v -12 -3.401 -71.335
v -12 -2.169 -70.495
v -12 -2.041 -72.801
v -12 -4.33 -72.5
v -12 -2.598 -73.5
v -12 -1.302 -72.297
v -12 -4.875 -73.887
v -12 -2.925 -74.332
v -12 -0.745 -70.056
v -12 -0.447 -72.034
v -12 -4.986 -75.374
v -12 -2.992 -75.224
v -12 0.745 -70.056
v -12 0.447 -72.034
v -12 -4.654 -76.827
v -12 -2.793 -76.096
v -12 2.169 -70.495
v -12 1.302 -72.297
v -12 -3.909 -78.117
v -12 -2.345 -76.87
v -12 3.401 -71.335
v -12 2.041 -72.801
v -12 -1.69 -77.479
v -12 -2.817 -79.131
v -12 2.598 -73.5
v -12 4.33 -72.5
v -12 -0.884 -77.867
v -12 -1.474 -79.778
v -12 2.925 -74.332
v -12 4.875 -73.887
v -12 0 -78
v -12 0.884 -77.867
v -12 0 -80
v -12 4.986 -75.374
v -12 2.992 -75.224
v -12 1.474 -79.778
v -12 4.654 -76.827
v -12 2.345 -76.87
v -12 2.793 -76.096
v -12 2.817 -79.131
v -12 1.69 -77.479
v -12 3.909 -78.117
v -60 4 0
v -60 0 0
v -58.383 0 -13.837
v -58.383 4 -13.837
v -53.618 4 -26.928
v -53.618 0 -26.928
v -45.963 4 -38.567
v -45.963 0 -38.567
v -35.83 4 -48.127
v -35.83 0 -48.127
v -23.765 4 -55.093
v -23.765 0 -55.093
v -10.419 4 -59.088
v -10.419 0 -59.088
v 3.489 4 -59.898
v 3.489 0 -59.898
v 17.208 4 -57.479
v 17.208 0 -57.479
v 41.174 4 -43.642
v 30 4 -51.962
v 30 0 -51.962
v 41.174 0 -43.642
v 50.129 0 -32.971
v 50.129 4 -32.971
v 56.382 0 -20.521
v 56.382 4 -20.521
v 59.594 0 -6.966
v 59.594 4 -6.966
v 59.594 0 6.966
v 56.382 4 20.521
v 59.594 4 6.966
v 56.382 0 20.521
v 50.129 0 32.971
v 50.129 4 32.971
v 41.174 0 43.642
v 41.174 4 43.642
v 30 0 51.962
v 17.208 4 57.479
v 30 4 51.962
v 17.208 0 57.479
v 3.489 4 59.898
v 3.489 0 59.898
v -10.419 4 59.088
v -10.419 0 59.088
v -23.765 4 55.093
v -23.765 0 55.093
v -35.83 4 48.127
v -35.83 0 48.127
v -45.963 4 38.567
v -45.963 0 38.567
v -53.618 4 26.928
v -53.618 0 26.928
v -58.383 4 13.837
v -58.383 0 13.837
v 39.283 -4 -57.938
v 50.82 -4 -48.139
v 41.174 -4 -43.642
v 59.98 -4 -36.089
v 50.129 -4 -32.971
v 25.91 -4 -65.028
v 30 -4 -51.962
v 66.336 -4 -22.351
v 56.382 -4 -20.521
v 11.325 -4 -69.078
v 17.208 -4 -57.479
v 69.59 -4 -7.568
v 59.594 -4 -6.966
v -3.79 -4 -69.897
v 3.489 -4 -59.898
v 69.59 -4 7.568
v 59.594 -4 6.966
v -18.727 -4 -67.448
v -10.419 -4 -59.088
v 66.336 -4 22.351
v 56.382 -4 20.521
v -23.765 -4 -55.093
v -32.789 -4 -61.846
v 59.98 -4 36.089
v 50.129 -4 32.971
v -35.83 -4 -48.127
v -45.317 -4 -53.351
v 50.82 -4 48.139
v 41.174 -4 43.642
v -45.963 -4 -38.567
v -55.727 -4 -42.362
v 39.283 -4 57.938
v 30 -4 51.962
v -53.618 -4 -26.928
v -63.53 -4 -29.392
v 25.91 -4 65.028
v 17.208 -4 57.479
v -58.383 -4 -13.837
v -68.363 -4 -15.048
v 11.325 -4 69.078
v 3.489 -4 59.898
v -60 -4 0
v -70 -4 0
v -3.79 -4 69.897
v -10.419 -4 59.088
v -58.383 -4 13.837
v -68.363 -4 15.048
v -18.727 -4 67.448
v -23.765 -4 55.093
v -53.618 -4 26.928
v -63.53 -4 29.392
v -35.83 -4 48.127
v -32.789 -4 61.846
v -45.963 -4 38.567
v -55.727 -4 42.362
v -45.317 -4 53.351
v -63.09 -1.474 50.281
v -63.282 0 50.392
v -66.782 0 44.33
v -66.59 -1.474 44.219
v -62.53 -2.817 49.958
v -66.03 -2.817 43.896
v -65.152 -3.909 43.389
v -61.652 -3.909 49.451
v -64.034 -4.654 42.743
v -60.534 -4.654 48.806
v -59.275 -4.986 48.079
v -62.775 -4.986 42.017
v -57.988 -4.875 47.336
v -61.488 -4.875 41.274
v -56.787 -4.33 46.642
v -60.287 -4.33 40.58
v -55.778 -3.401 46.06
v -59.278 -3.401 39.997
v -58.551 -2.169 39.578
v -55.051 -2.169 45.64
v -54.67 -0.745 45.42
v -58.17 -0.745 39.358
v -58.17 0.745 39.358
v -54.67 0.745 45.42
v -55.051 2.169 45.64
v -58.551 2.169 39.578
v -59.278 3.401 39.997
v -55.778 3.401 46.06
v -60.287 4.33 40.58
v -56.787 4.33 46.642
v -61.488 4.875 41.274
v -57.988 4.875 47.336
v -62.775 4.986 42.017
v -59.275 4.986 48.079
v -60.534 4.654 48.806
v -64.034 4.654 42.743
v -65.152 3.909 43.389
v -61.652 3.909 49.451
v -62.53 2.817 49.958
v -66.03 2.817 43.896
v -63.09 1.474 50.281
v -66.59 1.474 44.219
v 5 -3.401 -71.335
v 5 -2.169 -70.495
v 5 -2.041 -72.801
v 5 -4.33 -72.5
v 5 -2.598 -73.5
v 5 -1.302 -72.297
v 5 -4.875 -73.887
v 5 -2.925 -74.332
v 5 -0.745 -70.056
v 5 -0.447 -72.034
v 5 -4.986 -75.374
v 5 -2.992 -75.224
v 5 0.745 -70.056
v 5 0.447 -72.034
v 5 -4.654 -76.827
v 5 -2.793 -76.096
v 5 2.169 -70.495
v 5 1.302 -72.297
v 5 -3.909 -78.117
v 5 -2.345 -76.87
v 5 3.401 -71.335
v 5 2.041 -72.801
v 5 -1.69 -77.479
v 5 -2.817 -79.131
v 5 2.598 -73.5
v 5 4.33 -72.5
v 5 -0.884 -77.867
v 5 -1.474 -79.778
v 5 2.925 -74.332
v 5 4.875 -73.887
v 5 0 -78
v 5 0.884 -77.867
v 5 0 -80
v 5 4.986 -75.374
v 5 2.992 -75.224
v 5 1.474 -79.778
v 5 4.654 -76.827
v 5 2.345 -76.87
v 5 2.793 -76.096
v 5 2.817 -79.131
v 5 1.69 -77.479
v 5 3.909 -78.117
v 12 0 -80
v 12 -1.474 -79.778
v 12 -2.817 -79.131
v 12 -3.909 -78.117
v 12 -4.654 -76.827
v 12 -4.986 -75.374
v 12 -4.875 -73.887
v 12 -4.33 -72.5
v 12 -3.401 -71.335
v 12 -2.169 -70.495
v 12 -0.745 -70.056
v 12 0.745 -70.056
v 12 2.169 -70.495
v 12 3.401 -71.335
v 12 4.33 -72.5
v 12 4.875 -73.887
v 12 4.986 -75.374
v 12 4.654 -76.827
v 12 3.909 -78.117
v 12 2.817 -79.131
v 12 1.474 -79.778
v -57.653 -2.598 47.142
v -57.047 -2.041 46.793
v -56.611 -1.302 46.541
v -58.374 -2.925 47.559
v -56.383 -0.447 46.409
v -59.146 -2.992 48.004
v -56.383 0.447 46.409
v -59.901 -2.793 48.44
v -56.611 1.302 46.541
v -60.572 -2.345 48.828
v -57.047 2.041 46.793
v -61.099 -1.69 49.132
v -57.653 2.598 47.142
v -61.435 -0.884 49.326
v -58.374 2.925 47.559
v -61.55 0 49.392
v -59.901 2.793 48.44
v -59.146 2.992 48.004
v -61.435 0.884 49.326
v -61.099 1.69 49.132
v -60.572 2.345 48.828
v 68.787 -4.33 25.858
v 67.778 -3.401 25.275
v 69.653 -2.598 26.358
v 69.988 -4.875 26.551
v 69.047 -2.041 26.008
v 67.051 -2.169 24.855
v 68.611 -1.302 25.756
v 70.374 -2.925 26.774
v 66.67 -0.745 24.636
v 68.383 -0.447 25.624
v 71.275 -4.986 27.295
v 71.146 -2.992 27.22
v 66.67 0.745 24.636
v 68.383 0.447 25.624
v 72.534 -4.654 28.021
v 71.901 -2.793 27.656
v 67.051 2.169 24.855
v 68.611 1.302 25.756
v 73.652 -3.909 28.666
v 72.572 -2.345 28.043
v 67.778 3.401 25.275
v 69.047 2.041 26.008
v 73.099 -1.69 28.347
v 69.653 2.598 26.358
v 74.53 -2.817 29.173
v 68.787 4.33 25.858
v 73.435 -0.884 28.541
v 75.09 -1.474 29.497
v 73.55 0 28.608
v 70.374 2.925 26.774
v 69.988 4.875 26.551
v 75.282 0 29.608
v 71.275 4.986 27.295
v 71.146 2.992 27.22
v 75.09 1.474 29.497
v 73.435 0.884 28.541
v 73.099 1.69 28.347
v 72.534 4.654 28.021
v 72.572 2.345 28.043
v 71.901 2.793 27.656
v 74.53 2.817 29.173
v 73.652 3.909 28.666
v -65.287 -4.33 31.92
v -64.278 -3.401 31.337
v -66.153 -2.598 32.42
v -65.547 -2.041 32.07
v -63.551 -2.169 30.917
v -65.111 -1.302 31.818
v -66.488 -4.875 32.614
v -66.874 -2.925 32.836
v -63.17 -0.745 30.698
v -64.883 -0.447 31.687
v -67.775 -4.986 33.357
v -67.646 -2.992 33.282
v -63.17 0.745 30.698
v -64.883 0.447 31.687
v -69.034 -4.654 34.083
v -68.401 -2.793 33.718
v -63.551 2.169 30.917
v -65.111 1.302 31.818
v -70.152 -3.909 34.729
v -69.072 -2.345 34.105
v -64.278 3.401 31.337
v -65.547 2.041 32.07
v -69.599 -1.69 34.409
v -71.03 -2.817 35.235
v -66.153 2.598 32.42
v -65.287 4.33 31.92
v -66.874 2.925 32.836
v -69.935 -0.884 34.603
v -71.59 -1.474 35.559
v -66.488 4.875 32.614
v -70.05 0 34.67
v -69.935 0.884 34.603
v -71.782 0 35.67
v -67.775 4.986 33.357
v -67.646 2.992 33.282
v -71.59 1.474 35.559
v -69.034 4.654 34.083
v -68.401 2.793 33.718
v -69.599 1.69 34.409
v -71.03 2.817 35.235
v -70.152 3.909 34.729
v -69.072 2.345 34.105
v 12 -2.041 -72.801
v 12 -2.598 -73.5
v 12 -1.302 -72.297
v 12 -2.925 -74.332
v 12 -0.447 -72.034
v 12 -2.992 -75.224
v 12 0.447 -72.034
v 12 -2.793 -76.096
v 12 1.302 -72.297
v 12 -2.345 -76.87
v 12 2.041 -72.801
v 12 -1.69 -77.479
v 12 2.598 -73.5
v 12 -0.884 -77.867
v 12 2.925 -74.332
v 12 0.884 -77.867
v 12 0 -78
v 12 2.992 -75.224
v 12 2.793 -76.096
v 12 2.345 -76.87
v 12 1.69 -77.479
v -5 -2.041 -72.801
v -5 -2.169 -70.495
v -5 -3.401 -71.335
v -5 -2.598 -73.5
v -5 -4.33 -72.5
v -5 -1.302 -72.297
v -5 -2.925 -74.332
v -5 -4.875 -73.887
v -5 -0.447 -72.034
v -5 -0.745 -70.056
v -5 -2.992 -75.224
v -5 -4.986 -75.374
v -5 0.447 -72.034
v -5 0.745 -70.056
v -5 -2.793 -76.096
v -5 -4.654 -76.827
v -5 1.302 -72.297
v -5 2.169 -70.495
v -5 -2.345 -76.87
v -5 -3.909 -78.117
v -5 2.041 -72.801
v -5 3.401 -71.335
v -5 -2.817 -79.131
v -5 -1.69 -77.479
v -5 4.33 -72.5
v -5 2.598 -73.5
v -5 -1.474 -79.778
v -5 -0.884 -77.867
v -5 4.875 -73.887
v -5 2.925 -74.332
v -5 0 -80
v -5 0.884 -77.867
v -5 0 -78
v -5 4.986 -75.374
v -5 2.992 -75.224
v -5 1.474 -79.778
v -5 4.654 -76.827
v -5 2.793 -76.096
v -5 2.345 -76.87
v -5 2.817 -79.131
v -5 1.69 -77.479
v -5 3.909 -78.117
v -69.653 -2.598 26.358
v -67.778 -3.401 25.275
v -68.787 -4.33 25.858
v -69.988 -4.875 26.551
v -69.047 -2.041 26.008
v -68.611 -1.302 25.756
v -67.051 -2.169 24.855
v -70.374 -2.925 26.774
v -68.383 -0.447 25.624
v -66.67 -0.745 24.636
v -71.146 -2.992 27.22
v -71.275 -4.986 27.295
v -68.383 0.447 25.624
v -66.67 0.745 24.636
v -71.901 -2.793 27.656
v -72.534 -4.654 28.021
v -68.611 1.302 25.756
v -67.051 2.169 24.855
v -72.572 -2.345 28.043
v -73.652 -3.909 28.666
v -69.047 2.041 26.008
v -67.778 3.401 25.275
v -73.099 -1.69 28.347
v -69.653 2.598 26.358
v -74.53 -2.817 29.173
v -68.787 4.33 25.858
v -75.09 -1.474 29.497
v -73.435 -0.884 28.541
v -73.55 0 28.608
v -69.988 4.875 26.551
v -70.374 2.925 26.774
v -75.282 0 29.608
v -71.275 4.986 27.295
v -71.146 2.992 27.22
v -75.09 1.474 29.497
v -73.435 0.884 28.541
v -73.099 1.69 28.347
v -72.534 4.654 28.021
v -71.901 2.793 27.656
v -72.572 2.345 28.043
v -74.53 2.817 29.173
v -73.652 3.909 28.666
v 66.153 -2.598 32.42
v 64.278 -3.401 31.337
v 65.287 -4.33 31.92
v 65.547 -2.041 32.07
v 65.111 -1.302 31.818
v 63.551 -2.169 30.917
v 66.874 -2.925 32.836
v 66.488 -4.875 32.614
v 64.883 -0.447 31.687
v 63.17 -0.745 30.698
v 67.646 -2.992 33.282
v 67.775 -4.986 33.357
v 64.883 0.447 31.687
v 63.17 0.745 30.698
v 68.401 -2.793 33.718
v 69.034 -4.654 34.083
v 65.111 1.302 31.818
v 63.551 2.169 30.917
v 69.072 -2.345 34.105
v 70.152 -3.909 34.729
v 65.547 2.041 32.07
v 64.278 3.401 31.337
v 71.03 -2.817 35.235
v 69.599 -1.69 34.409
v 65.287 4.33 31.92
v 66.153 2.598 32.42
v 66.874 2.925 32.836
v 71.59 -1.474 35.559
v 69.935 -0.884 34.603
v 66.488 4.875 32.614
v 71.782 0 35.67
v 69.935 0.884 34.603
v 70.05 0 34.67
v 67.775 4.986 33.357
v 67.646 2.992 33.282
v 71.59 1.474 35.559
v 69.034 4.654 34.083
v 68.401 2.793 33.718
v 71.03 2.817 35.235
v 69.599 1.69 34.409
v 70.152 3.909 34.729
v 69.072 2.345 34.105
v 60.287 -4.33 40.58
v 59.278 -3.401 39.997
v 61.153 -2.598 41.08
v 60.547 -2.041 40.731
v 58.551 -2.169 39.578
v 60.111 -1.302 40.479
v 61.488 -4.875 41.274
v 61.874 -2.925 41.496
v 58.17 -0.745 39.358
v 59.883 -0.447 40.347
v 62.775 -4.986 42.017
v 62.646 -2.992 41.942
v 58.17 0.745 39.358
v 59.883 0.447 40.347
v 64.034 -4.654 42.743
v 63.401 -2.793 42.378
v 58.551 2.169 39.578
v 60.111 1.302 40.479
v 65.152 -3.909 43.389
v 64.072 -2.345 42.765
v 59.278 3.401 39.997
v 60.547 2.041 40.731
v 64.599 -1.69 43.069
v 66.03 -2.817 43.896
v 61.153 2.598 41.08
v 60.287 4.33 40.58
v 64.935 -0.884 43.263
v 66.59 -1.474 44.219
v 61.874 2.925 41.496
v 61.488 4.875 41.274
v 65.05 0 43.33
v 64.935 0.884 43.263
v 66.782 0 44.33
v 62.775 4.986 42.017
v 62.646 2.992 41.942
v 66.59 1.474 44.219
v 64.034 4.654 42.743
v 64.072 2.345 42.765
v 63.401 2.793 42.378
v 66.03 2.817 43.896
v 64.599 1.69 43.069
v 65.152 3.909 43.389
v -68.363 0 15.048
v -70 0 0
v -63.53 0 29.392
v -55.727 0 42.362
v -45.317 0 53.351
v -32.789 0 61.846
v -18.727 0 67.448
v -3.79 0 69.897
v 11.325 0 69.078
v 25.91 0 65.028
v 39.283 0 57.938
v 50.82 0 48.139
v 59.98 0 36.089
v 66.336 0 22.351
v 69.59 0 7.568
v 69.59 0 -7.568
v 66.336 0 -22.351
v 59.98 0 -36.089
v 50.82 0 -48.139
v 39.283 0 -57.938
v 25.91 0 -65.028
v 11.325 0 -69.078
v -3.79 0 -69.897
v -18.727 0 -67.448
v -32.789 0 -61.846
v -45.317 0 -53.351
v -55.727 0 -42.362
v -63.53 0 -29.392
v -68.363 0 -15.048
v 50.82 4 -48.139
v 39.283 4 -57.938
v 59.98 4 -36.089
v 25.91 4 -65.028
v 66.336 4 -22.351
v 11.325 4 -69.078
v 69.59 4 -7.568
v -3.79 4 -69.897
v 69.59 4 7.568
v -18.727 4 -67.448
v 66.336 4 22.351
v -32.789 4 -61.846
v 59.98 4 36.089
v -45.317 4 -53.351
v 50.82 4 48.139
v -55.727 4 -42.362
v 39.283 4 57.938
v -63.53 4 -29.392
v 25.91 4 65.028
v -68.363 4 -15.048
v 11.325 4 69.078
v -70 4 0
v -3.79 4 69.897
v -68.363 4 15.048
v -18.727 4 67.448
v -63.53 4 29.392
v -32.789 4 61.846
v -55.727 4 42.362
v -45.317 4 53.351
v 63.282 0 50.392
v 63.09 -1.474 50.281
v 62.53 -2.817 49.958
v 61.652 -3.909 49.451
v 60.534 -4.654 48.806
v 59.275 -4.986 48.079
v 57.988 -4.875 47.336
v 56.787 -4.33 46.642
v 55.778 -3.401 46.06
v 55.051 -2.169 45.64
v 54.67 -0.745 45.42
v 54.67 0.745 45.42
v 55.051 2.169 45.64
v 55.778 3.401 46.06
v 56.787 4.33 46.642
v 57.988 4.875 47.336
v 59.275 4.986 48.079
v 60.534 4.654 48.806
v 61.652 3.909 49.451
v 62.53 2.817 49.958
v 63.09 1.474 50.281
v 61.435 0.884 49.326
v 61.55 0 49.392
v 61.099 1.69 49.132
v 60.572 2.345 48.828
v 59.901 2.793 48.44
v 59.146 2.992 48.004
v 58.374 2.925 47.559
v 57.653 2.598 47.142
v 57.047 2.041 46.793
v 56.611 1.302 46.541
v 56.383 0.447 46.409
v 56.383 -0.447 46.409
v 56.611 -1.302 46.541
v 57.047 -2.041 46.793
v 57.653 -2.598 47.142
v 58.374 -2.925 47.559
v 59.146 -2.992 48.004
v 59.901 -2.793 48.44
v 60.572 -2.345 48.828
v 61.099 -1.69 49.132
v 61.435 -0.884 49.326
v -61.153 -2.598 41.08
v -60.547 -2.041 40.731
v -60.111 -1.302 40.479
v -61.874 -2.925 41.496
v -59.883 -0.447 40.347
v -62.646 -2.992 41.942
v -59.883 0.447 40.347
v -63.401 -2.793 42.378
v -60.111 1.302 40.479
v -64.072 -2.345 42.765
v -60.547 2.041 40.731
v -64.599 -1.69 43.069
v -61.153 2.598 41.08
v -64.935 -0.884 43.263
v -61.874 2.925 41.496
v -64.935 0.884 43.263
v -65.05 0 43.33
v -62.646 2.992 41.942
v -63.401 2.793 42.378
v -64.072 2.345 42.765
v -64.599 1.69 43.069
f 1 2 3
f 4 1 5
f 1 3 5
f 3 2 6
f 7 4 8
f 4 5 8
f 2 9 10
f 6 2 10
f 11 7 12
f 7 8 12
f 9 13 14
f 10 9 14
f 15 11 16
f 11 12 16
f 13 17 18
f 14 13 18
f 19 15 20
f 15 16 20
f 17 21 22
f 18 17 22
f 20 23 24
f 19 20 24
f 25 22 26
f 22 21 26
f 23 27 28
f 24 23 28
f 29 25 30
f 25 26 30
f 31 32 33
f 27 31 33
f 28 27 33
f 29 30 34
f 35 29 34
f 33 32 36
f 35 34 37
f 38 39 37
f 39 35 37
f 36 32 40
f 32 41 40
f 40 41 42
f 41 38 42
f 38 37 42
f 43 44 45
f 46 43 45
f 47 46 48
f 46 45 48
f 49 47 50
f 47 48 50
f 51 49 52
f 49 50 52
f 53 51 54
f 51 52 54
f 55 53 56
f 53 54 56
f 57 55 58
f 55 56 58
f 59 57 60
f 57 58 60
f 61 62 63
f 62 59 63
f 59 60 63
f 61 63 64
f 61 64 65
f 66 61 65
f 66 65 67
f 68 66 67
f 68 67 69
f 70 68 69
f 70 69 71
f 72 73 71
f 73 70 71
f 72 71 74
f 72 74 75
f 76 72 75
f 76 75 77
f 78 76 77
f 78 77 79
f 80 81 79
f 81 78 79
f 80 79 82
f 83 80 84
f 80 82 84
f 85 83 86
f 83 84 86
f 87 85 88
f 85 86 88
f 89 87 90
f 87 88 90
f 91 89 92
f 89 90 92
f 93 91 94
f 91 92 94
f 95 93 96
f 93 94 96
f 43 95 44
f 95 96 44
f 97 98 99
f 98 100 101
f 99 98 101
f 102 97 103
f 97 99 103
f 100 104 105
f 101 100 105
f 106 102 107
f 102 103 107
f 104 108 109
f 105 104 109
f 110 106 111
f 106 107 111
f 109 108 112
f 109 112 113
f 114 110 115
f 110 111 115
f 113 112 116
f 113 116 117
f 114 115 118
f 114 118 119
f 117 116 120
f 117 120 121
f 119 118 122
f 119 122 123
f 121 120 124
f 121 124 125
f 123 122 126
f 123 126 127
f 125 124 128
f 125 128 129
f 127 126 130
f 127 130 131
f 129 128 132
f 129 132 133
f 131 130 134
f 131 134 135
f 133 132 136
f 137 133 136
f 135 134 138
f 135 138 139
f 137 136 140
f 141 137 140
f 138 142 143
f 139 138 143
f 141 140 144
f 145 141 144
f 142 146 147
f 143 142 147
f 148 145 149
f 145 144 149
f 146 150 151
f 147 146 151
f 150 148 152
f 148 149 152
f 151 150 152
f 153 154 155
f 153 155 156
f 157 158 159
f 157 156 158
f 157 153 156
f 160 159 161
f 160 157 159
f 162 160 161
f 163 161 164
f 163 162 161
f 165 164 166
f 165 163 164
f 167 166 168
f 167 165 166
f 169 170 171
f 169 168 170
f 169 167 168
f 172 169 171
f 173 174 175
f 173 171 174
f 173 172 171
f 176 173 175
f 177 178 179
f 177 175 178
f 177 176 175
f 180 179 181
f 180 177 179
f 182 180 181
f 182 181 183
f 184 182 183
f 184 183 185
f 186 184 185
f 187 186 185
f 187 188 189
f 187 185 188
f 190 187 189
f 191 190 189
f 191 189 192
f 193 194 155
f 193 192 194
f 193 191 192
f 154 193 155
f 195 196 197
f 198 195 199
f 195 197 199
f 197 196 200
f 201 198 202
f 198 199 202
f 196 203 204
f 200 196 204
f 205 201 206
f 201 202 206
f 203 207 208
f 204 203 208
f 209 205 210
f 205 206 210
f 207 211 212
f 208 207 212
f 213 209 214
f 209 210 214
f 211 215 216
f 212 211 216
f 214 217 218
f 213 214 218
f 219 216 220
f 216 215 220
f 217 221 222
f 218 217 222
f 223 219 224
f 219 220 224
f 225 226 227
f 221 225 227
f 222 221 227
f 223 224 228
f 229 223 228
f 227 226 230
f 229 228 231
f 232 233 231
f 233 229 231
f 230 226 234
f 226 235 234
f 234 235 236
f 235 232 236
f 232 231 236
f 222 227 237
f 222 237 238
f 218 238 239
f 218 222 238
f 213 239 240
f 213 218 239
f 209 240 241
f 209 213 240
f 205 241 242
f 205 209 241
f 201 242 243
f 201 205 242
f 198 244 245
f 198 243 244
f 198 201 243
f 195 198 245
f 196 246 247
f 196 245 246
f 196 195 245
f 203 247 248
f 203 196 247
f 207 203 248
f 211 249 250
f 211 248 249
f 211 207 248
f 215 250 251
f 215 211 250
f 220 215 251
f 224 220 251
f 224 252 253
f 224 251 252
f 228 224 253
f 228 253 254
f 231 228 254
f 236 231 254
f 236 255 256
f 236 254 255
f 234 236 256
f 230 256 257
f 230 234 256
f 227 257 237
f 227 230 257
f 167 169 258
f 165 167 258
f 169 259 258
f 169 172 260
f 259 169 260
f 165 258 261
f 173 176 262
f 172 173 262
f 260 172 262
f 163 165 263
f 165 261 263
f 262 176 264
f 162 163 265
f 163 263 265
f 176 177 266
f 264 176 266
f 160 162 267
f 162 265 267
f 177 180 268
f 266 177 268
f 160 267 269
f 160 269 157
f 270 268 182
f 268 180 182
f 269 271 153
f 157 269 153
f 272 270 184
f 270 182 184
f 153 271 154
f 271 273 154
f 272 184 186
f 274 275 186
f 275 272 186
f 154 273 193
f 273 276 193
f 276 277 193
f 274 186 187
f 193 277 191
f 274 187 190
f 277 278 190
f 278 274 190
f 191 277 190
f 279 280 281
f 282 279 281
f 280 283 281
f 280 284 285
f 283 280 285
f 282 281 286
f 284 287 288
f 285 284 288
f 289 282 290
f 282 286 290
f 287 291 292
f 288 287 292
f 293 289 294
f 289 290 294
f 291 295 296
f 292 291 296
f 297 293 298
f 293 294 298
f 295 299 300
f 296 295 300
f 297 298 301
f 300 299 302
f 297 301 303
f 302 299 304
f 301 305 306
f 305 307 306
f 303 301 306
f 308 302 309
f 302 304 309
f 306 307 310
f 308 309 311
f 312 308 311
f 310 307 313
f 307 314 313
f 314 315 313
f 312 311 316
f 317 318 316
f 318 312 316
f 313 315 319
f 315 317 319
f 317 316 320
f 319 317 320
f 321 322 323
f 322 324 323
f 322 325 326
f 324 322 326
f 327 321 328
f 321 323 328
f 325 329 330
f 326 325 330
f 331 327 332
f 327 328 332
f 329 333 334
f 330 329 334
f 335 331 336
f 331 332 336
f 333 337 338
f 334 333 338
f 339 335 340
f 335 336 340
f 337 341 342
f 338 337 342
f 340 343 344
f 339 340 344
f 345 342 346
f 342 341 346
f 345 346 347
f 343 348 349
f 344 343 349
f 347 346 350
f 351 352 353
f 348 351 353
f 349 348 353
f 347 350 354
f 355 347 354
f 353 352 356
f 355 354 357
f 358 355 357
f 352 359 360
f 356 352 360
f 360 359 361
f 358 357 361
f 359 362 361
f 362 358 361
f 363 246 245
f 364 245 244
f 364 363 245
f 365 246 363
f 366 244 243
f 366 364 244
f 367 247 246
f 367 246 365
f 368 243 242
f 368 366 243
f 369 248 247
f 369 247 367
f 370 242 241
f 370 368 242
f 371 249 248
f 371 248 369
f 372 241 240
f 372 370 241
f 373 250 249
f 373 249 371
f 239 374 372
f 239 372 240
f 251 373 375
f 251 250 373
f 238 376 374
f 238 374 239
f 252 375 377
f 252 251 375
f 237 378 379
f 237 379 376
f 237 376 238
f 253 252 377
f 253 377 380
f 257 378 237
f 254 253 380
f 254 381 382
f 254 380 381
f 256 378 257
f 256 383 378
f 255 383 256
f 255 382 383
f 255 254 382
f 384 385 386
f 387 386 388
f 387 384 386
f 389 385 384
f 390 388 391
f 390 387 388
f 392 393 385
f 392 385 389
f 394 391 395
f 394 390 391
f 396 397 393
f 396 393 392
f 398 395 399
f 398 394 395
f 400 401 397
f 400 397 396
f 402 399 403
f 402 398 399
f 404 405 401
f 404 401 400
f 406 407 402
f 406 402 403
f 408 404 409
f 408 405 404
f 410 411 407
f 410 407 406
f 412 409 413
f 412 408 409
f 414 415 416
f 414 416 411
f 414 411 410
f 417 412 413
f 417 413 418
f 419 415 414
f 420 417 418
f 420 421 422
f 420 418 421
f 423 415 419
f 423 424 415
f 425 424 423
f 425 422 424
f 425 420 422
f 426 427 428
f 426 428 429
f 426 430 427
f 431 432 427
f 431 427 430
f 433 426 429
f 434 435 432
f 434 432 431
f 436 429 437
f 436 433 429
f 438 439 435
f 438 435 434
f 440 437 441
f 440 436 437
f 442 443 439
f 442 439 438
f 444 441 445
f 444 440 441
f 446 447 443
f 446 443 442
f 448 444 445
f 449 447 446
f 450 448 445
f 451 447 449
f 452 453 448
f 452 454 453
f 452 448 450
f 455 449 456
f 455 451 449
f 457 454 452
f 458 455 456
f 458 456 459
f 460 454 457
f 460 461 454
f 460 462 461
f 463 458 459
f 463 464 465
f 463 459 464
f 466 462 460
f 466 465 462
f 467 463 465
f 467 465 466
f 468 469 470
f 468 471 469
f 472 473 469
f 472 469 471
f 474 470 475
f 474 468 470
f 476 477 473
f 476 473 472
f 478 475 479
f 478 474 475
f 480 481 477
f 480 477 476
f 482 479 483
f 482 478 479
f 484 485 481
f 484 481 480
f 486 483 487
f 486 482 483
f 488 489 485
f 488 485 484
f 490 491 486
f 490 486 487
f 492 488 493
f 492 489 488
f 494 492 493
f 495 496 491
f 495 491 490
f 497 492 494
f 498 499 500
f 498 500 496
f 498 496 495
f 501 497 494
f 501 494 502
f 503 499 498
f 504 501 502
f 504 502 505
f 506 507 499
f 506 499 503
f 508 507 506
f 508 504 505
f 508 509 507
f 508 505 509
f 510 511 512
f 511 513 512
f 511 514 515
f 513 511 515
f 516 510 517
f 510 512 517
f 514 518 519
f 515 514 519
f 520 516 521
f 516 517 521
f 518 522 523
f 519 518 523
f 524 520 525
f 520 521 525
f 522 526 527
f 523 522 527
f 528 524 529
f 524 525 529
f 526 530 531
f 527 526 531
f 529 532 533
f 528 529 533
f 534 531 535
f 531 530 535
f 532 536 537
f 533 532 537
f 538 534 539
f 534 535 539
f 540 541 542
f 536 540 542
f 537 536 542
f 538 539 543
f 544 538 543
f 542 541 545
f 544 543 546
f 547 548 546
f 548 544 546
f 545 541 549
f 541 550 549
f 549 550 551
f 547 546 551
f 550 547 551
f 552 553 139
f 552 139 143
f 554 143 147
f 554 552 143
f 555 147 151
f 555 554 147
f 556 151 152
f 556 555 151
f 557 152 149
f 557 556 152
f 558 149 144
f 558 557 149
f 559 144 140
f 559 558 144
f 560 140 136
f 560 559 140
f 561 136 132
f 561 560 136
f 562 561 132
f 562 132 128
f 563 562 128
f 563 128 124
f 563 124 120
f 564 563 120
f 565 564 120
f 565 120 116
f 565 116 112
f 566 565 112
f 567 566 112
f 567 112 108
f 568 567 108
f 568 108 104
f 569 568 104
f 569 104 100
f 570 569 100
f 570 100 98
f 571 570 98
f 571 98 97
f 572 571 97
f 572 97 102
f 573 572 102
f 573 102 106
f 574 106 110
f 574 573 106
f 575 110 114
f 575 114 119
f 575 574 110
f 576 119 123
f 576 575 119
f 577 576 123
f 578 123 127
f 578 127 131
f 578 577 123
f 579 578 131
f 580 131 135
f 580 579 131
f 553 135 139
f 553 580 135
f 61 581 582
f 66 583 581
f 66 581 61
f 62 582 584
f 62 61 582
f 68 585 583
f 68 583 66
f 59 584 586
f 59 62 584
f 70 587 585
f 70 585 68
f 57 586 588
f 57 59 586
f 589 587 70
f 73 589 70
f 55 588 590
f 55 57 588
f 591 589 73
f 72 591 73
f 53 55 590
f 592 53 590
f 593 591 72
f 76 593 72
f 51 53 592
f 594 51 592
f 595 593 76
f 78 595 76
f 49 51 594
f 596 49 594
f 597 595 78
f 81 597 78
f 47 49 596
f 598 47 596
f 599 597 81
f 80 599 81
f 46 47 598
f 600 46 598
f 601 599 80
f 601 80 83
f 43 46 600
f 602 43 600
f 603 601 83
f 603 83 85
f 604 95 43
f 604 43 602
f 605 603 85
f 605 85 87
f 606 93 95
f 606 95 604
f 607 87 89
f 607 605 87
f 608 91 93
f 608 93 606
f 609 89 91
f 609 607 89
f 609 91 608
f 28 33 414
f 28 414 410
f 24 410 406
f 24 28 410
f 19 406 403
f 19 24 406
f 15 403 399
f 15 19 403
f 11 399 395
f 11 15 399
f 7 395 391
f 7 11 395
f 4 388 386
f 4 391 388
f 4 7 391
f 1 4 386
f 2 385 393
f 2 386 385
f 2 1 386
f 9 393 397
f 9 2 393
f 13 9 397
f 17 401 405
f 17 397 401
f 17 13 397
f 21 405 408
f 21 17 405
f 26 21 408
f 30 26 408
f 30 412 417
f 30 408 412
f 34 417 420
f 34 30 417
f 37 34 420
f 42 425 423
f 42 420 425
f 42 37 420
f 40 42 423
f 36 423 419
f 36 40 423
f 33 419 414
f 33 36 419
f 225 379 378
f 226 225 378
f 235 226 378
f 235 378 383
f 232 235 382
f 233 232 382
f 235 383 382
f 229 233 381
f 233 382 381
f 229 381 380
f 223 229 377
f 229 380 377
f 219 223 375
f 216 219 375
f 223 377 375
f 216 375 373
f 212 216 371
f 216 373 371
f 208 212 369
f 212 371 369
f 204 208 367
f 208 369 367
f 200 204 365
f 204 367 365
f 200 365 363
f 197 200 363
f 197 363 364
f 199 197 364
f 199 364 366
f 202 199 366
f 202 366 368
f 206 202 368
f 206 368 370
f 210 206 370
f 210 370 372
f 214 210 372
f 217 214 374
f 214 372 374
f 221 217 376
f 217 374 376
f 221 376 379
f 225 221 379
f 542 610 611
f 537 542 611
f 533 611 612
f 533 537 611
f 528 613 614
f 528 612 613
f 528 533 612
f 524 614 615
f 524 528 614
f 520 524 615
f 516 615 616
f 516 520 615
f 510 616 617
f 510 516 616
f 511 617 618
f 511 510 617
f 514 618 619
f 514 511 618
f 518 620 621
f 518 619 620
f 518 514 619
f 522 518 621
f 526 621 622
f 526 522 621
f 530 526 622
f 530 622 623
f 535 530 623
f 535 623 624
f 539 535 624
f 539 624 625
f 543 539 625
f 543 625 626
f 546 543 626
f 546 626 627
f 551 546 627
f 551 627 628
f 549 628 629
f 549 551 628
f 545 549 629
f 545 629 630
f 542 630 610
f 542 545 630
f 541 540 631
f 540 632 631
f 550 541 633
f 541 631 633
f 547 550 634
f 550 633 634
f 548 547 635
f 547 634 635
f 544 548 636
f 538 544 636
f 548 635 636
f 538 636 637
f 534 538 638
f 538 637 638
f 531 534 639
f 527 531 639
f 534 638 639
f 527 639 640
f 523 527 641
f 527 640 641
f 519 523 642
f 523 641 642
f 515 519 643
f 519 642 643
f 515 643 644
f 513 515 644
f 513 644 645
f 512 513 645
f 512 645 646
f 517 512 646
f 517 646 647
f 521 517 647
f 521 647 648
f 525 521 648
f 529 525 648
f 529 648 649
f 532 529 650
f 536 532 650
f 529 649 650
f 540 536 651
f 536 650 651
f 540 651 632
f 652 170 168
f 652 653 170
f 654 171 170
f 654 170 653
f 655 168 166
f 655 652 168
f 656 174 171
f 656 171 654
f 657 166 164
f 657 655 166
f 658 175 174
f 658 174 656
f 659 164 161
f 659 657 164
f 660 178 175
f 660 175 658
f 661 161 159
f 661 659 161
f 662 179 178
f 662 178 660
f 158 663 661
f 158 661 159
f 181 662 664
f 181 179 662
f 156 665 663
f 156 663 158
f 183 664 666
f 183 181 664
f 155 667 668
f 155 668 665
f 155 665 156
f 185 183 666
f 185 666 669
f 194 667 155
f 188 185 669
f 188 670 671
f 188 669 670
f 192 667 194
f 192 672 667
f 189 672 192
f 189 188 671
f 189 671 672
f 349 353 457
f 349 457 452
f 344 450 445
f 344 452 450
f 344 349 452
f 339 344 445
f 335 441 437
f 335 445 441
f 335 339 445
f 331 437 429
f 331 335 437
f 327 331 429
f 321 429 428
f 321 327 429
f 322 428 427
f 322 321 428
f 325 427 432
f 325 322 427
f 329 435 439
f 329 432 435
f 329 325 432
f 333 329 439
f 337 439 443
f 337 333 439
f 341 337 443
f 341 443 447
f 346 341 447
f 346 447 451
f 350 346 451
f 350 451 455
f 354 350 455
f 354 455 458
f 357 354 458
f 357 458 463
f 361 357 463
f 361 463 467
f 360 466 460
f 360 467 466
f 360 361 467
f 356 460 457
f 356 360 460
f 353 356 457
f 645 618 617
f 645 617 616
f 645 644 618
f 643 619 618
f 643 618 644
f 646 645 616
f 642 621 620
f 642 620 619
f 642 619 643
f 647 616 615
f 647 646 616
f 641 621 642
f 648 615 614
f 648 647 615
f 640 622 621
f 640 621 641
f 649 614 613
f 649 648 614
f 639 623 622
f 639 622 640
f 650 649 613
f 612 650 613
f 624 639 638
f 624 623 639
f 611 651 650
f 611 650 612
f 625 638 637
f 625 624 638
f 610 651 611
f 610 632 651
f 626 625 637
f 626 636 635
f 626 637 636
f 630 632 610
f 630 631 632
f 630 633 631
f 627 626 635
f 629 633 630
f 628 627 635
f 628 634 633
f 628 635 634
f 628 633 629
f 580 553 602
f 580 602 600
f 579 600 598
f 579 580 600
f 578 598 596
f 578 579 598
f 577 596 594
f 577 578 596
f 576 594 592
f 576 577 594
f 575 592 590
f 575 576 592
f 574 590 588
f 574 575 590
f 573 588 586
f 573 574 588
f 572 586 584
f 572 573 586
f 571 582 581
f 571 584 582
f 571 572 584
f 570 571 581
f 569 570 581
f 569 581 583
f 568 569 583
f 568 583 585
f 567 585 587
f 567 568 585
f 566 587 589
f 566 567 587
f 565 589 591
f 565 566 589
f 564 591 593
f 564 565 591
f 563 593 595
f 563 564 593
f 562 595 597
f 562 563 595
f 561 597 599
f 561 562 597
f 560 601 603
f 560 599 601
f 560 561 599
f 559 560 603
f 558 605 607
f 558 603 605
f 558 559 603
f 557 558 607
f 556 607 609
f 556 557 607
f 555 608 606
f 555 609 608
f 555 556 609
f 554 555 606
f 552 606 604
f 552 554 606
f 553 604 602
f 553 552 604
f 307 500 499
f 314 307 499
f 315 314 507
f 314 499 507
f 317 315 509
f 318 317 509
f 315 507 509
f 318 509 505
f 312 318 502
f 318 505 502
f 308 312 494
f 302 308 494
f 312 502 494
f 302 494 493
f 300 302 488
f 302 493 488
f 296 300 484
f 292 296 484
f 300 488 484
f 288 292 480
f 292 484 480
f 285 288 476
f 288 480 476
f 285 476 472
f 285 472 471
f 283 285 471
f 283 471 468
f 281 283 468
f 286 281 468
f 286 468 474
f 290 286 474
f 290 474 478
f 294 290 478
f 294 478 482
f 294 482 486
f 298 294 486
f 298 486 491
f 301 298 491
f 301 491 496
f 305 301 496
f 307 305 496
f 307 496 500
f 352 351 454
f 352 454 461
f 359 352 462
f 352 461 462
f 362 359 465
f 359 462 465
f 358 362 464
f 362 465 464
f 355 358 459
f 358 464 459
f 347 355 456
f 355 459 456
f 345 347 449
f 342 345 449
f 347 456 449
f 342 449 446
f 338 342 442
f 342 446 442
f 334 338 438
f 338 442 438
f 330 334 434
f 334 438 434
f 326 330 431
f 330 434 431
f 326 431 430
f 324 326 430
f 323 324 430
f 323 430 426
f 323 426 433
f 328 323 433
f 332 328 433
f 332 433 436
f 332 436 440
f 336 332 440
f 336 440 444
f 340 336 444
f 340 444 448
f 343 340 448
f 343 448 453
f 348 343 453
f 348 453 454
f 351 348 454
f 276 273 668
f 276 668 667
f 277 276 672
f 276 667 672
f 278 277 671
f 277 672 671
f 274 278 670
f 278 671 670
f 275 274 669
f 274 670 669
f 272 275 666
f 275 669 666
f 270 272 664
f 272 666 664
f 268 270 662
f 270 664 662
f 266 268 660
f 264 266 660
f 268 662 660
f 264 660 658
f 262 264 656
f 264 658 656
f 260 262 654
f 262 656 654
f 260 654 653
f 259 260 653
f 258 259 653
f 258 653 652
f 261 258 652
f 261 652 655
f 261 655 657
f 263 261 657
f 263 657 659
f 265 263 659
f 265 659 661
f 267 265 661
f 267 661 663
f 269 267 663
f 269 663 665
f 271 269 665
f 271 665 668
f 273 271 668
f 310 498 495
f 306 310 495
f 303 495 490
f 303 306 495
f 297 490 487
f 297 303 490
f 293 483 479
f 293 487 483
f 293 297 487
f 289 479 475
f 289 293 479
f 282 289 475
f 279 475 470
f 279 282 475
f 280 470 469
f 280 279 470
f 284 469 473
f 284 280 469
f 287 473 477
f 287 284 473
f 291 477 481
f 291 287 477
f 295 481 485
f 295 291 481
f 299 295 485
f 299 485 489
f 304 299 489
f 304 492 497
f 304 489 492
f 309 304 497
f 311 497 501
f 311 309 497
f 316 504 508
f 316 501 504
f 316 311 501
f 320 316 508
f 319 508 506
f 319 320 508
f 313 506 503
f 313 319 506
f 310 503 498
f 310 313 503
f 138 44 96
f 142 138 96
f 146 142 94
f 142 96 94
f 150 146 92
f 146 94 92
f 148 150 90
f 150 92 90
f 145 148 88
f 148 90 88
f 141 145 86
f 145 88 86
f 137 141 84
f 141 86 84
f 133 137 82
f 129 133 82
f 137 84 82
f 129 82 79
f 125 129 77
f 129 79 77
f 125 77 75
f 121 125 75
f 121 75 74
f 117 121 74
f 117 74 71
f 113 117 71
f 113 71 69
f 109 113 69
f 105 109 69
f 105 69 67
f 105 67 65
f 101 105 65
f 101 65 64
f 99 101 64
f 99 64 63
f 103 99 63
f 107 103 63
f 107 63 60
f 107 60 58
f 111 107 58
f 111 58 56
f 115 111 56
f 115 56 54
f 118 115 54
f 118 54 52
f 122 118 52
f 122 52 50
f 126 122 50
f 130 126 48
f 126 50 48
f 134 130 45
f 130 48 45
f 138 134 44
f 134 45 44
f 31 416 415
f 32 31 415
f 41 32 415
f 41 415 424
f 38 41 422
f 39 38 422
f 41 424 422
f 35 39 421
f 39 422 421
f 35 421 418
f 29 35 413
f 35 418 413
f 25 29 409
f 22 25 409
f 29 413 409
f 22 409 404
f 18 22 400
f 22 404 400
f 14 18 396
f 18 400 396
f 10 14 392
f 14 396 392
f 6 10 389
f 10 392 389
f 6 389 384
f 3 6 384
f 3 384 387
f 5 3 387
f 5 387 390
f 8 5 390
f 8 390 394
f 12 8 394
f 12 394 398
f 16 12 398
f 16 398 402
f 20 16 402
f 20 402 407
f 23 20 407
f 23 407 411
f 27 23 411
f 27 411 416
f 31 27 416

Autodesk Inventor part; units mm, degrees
ref_plane "YZ Plane" through (0, 0, 0) normal (1, 0, 0) x (0, 1, 0)
ref_plane "XZ Plane" through (0, 0, 0) normal (0, 1, 0) x (-1, 0, 0)
ref_plane "XY Plane" through (0, 0, 0) normal (0, 0, 1) x (1, 0, 0)
sketch "スケッチ1" plane through (0, 0, 0) normal (0, 1, 0) x (-1, 0, 0)
  circle A0 centre (0, 0) radius 70
  circle A1 centre (0, 0) radius 60
  dimension "d0" = 140
  dimension "d1" = 120
extrude "押し出し1" add sketch "スケッチ1" along normal mid plane 8
sketch "スケッチ2" plane through (0, 0, 0) normal (0, 1, 0) x (-1, 0, 0)
  line L0 (12, -78) -> (5, -78)
  line L1 (5, -78) -> (5, -80)
  line L2 (5, -80) -> (12, -80)
  line L3 (12, -80) -> (12, -78)
  line L4 (-5, -78) -> (-12, -78)
  line L5 (-12, -78) -> (-12, -80)
  line L6 (-12, -80) -> (-5, -80)
  line L7 (-5, -80) -> (-5, -78)
  line L8 (0, -109.632) -> (0, 99.9387) projected
  line L9 (-98, 0) -> (98, 0) projected
  line L10 (18.6629, -75) -> (-18.486, -75)
  point P0 (0, 0)
  dimension "d5" = 75
  dimension "d6" = 3
  dimension "d7" = 5
  dimension "d8" = 10
  dimension "d9" = 24
revolve "回転1" add sketch "スケッチ2" angle 360 about axis through (-18.6629, 0, -75) along (1, 0, 0)
pattern_circular "円形状パターン1" count 3 over 360 about axis through (0, -10, 0) along (0, 1, 0) of "回転1"
properties part number "EndEffector"
